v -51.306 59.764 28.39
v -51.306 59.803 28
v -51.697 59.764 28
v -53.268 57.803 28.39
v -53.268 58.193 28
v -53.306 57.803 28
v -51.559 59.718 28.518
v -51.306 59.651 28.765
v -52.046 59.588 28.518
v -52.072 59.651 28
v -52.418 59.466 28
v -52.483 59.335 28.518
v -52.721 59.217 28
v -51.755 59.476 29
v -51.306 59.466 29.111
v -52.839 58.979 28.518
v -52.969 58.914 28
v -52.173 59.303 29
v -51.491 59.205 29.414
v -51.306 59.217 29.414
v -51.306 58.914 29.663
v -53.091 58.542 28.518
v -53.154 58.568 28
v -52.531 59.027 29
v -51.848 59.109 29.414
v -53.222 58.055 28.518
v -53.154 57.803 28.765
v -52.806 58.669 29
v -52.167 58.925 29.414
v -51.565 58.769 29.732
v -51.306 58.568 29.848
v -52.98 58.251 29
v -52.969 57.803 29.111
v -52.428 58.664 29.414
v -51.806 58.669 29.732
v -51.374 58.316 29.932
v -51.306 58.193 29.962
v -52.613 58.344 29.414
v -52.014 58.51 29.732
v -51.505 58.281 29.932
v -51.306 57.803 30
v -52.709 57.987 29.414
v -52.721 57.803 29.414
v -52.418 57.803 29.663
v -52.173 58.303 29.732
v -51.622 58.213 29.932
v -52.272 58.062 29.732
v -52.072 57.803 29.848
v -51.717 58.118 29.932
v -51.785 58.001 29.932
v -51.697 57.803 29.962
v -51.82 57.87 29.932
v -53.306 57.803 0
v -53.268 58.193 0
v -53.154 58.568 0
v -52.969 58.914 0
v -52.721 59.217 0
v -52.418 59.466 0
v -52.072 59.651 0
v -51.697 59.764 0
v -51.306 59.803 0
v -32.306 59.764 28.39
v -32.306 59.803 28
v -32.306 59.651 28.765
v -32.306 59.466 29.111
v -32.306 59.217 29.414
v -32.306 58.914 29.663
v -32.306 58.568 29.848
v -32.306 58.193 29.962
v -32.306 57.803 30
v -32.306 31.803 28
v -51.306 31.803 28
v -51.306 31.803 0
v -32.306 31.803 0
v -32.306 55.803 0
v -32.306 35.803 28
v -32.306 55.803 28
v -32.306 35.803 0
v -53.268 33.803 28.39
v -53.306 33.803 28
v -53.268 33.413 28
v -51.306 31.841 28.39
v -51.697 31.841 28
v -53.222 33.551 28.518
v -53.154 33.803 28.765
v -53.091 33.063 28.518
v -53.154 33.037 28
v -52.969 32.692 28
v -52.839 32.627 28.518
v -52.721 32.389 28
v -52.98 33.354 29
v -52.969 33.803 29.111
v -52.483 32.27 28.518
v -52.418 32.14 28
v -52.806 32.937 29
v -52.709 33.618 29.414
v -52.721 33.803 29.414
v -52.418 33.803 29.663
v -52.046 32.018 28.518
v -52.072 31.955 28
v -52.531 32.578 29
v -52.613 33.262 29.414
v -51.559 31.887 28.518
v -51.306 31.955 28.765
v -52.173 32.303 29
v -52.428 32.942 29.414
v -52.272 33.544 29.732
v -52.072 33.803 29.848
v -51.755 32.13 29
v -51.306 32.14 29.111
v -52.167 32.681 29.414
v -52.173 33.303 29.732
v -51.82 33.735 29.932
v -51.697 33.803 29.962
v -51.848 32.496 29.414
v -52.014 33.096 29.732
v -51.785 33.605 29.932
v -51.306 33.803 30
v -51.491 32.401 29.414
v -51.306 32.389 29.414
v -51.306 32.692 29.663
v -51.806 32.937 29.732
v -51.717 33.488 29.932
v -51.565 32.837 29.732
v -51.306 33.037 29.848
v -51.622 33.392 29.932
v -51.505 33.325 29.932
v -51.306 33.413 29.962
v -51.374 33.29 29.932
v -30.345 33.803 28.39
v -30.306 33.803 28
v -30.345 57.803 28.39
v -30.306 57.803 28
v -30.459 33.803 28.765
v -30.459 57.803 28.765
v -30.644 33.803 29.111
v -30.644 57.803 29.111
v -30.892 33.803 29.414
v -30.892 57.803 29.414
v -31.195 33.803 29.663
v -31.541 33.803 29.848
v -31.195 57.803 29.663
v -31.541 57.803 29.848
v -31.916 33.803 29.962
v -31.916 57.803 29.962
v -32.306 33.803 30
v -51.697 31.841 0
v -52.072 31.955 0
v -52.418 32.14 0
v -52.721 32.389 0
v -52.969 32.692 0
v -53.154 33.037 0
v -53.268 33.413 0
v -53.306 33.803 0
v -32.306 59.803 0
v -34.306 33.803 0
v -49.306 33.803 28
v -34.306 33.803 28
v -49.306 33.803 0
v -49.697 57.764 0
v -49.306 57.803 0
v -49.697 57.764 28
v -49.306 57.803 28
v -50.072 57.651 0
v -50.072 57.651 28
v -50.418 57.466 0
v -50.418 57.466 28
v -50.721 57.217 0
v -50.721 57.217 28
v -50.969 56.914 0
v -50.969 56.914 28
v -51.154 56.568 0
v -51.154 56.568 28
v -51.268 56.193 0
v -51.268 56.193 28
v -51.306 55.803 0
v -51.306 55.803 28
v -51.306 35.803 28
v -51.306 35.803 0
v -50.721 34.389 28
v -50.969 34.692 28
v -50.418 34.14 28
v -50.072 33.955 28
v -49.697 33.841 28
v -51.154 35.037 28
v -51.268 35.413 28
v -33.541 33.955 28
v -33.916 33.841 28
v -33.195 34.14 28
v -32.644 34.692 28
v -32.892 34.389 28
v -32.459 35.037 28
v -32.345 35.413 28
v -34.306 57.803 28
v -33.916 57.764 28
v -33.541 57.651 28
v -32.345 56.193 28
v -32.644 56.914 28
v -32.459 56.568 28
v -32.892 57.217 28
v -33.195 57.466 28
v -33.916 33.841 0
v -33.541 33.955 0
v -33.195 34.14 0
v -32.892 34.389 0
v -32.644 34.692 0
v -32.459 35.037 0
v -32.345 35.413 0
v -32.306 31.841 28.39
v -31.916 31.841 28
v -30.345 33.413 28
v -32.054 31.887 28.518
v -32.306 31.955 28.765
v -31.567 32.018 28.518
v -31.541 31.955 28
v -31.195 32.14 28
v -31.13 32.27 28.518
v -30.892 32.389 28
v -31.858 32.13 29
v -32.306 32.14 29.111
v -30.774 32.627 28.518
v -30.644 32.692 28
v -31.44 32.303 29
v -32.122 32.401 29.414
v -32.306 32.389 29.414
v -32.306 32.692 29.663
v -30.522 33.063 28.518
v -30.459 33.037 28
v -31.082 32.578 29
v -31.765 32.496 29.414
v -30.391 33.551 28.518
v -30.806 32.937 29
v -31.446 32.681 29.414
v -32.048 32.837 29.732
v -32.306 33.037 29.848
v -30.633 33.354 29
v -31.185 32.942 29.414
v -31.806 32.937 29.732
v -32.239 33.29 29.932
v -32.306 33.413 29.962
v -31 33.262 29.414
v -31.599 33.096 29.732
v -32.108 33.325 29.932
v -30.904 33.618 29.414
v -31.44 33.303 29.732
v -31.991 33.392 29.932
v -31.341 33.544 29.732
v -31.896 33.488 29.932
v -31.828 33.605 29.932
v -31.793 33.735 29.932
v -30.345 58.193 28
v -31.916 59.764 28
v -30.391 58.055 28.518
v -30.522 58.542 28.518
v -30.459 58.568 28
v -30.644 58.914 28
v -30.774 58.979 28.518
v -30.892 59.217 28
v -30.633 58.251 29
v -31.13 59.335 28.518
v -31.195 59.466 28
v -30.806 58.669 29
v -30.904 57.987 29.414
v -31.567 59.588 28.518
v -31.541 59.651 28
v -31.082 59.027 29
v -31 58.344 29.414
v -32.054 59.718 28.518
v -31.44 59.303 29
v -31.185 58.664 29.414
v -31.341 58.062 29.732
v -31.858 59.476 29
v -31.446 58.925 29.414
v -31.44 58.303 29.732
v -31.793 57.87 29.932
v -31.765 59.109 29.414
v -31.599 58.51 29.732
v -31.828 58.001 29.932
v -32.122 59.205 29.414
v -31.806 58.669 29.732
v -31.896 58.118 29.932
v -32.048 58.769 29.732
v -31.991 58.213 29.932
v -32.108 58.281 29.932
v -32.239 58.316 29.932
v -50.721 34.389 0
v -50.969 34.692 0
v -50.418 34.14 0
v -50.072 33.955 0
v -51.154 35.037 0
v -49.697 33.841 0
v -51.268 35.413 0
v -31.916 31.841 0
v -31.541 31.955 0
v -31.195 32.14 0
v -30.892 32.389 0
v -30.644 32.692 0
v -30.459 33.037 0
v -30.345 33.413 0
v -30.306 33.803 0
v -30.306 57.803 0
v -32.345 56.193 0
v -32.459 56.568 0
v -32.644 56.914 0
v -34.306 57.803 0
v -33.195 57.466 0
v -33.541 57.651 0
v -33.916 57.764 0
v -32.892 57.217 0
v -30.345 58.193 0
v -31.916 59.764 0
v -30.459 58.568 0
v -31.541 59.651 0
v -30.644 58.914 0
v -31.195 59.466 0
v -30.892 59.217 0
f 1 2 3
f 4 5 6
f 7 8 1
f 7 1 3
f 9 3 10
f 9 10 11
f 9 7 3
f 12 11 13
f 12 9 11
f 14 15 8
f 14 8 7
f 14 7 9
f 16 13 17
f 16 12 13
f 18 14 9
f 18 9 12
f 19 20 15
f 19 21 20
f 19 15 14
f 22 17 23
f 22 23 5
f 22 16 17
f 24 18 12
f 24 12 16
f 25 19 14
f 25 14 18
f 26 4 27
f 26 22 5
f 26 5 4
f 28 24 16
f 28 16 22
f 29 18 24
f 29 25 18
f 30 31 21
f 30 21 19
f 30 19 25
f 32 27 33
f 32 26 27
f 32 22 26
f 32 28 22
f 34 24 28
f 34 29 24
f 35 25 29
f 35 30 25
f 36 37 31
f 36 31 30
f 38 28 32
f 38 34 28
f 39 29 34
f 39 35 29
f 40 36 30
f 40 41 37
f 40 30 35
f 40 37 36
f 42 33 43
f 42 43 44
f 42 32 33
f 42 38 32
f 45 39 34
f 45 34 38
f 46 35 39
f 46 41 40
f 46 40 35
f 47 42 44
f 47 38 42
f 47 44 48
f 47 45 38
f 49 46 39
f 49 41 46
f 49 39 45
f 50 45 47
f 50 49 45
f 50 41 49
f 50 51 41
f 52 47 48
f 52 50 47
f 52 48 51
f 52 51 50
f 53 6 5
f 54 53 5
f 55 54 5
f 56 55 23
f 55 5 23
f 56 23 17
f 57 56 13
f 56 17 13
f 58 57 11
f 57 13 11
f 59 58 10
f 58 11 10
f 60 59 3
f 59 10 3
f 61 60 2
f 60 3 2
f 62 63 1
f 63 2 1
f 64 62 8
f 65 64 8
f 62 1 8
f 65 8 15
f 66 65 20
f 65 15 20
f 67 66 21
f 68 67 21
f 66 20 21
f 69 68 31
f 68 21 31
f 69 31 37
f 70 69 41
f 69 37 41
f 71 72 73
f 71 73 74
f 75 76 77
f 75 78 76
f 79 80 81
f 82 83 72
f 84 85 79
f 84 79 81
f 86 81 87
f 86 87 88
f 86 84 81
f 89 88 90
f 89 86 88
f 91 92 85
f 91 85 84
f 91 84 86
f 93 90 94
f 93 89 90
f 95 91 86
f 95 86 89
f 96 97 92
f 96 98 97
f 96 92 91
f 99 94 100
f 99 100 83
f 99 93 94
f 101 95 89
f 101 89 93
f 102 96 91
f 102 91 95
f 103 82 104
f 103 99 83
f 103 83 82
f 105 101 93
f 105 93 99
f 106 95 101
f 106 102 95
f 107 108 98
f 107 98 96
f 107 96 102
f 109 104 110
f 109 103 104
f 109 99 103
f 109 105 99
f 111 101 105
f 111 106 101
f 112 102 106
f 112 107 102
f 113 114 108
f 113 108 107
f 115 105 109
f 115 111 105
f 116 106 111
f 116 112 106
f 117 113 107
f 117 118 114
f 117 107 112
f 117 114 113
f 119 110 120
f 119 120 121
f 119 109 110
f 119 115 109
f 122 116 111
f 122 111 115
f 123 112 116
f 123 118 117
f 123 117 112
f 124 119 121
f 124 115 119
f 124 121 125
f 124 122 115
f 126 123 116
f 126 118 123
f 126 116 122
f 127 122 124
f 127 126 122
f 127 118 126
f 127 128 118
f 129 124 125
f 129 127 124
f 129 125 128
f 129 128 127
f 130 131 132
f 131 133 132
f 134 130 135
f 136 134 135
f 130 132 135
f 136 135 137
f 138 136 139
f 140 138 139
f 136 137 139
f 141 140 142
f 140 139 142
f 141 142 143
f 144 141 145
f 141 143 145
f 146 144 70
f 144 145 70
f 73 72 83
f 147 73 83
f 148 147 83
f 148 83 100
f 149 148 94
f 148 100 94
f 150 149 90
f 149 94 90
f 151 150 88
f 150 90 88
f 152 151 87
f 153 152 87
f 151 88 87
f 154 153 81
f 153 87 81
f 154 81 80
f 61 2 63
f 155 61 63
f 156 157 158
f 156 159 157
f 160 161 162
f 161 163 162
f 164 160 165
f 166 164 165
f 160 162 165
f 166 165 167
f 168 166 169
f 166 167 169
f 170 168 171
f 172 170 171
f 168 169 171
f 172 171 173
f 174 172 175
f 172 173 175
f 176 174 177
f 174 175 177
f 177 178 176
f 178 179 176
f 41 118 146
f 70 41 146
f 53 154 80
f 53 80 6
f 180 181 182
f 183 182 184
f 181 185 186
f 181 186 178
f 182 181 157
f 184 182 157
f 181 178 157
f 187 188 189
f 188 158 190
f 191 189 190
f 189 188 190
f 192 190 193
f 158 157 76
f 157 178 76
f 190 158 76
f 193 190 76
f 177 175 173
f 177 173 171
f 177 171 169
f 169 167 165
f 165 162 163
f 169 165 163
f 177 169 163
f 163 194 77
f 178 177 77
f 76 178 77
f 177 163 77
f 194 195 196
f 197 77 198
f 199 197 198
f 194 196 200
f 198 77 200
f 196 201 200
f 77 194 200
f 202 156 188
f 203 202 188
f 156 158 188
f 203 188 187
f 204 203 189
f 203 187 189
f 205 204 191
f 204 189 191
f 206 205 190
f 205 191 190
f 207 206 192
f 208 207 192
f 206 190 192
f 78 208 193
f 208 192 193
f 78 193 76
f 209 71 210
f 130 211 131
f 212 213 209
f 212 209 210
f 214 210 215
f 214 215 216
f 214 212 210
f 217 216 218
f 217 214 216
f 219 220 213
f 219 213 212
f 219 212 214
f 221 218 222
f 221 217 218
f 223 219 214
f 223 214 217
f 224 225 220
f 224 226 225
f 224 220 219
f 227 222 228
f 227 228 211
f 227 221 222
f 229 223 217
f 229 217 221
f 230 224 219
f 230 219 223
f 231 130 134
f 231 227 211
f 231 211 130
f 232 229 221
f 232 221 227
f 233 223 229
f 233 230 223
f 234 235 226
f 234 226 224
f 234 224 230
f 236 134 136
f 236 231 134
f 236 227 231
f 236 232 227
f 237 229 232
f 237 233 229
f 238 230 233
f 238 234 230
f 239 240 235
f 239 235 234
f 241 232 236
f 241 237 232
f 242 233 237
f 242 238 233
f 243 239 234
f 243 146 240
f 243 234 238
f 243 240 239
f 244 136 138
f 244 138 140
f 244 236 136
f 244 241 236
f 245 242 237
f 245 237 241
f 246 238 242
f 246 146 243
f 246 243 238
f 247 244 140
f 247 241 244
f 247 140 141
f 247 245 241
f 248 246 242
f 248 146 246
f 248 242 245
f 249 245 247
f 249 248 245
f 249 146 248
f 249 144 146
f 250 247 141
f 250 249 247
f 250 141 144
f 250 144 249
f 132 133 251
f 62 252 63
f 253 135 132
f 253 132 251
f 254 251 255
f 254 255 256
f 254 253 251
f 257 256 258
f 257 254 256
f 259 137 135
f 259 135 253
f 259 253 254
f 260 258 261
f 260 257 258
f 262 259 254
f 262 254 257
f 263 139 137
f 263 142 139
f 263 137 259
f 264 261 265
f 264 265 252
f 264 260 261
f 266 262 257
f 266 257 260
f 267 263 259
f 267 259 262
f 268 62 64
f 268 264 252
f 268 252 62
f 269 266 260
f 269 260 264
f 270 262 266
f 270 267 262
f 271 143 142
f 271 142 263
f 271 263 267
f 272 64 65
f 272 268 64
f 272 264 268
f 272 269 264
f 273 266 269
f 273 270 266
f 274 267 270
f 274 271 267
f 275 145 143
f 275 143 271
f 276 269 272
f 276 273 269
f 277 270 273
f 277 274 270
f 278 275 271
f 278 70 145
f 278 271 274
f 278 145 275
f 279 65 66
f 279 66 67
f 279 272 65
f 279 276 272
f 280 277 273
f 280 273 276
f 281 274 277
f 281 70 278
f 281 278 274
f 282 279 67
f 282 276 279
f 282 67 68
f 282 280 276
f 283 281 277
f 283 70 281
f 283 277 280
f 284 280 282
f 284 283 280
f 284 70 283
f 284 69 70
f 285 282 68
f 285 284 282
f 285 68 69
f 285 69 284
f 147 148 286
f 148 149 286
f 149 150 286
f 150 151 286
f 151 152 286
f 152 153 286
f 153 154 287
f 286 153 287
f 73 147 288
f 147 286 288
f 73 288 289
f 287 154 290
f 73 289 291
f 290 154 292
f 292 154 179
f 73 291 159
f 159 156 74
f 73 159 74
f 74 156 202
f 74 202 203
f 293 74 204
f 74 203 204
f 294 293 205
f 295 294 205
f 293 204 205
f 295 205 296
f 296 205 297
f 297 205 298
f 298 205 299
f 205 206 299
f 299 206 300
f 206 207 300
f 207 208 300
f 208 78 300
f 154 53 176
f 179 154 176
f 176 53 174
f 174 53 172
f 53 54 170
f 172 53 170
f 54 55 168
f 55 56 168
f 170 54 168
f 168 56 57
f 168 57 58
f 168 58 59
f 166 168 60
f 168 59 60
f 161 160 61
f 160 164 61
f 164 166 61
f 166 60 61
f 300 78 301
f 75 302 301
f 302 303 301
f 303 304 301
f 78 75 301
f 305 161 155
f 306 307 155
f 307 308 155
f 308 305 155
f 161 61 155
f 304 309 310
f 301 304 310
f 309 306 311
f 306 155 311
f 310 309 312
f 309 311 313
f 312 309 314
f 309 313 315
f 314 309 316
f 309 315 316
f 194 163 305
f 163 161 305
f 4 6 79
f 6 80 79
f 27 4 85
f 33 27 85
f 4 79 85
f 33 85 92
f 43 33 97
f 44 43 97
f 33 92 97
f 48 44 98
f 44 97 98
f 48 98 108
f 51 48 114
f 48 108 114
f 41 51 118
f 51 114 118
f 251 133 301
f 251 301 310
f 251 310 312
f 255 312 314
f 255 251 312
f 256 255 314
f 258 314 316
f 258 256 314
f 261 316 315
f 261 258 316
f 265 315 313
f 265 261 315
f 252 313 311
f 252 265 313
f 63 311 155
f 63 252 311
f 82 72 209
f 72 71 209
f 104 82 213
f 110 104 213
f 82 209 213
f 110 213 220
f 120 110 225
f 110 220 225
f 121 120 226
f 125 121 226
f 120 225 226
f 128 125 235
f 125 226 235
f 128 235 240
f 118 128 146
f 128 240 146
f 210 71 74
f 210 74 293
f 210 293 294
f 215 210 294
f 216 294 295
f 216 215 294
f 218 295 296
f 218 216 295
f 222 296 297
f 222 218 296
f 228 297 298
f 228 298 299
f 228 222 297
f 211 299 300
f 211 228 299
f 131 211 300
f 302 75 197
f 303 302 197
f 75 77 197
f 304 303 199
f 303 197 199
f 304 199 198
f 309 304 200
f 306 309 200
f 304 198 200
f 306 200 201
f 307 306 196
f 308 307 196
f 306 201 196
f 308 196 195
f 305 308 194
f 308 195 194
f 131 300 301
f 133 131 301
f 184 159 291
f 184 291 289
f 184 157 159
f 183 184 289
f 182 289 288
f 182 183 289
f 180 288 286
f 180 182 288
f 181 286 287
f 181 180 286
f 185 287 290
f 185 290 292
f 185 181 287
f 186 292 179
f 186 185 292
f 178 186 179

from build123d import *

# Parameters (mm, degrees)
F0_W     = 23
F0_H     = 28
F1_DEPTH = 30
F2_R     = 2
F3_R     = 2
F4_R     = 2
F5_R     = 2
F6_R     = 2
F7_T     = 2
F8_R     = 2


# Not quite as in the source:
# - a feature of the source that left no trace in its solid (it failed there, or was rolled back) is left out
# - a shell that OpenCascade refuses in one call is made with other operations: the cavity is built on its own and cut out


with BuildPart() as f1:
    # F0 (on Top) → F1 (new body)
    with BuildSketch(Plane.XY):
        with Locations((-41.8064879576, 45.8027429283)):
            Rectangle(F0_W, F0_H)
    extrude(amount=F1_DEPTH)

    # F2
    f2_edges = [f1.edges().sort_by_distance(p)[0] for p in [
        (-30.306488, 31.802743, 15),
    ]]
    fillet(f2_edges, radius=F2_R)

    # F3
    f3_edges = [f1.edges().sort_by_distance(p)[0] for p in [
        (-30.306488, 59.802743, 15),
    ]]
    fillet(f3_edges, radius=F3_R)

    # F4
    f4_edges = [f1.edges().sort_by_distance(p)[0] for p in [
        (-53.306488, 31.802743, 15),
    ]]
    fillet(f4_edges, radius=F4_R)

    # F5
    f5_edges = [f1.edges().sort_by_distance(p)[0] for p in [
        (-53.306488, 59.802743, 15),
    ]]
    fillet(f5_edges, radius=F5_R)

    # F6
    f6_edges = [f1.edges().sort_by_distance(p)[0] for p in [
        (-41.806488, 31.802743, 30),
    ]]
    fillet(f6_edges, radius=F6_R)

    # F7: shell of thickness 2, made by hand


with BuildPart() as f7_core1:
    # F7_t2: copy of F1
    add(f1.part)

    # the walls: a layer under each face that stays
    f7_faces = [f7_core1.faces().sort_by_distance(p)[0] for p in [
        (-53.3064879576, 45.8027429283, 14),
        (-41.8064879576, 59.8027429283, 14),
        (-41.8064879576, 45.8027429283, 30),
        (-41.8064879576, 31.8027429283, 14),
        (-30.3064879576, 45.8027429283, 14),
    ]]
    thicken(f7_faces, amount=-F7_T, mode=Mode.SUBTRACT)


with BuildPart() as f1_1:
    add(f1.part)

    # what is left inside the walls is the cavity
    f7_cavity = [f7_core1.part.solids().sort_by_distance(p)[0] for p in [
        (-51.286488, 45.802743, 18.666667),
    ]]
    add(f7_cavity, mode=Mode.SUBTRACT)

    # F8
    f8_edges = [f1_1.edges().sort_by_distance(p)[0] for p in [
        (-51.306488, 57.802743, 14),
        (-51.306488, 33.802743, 14),
        (-32.306488, 33.802743, 14),
        (-32.306488, 57.802743, 14),
    ]]
    fillet(f8_edges, radius=F8_R)


solid = f1_1.part
